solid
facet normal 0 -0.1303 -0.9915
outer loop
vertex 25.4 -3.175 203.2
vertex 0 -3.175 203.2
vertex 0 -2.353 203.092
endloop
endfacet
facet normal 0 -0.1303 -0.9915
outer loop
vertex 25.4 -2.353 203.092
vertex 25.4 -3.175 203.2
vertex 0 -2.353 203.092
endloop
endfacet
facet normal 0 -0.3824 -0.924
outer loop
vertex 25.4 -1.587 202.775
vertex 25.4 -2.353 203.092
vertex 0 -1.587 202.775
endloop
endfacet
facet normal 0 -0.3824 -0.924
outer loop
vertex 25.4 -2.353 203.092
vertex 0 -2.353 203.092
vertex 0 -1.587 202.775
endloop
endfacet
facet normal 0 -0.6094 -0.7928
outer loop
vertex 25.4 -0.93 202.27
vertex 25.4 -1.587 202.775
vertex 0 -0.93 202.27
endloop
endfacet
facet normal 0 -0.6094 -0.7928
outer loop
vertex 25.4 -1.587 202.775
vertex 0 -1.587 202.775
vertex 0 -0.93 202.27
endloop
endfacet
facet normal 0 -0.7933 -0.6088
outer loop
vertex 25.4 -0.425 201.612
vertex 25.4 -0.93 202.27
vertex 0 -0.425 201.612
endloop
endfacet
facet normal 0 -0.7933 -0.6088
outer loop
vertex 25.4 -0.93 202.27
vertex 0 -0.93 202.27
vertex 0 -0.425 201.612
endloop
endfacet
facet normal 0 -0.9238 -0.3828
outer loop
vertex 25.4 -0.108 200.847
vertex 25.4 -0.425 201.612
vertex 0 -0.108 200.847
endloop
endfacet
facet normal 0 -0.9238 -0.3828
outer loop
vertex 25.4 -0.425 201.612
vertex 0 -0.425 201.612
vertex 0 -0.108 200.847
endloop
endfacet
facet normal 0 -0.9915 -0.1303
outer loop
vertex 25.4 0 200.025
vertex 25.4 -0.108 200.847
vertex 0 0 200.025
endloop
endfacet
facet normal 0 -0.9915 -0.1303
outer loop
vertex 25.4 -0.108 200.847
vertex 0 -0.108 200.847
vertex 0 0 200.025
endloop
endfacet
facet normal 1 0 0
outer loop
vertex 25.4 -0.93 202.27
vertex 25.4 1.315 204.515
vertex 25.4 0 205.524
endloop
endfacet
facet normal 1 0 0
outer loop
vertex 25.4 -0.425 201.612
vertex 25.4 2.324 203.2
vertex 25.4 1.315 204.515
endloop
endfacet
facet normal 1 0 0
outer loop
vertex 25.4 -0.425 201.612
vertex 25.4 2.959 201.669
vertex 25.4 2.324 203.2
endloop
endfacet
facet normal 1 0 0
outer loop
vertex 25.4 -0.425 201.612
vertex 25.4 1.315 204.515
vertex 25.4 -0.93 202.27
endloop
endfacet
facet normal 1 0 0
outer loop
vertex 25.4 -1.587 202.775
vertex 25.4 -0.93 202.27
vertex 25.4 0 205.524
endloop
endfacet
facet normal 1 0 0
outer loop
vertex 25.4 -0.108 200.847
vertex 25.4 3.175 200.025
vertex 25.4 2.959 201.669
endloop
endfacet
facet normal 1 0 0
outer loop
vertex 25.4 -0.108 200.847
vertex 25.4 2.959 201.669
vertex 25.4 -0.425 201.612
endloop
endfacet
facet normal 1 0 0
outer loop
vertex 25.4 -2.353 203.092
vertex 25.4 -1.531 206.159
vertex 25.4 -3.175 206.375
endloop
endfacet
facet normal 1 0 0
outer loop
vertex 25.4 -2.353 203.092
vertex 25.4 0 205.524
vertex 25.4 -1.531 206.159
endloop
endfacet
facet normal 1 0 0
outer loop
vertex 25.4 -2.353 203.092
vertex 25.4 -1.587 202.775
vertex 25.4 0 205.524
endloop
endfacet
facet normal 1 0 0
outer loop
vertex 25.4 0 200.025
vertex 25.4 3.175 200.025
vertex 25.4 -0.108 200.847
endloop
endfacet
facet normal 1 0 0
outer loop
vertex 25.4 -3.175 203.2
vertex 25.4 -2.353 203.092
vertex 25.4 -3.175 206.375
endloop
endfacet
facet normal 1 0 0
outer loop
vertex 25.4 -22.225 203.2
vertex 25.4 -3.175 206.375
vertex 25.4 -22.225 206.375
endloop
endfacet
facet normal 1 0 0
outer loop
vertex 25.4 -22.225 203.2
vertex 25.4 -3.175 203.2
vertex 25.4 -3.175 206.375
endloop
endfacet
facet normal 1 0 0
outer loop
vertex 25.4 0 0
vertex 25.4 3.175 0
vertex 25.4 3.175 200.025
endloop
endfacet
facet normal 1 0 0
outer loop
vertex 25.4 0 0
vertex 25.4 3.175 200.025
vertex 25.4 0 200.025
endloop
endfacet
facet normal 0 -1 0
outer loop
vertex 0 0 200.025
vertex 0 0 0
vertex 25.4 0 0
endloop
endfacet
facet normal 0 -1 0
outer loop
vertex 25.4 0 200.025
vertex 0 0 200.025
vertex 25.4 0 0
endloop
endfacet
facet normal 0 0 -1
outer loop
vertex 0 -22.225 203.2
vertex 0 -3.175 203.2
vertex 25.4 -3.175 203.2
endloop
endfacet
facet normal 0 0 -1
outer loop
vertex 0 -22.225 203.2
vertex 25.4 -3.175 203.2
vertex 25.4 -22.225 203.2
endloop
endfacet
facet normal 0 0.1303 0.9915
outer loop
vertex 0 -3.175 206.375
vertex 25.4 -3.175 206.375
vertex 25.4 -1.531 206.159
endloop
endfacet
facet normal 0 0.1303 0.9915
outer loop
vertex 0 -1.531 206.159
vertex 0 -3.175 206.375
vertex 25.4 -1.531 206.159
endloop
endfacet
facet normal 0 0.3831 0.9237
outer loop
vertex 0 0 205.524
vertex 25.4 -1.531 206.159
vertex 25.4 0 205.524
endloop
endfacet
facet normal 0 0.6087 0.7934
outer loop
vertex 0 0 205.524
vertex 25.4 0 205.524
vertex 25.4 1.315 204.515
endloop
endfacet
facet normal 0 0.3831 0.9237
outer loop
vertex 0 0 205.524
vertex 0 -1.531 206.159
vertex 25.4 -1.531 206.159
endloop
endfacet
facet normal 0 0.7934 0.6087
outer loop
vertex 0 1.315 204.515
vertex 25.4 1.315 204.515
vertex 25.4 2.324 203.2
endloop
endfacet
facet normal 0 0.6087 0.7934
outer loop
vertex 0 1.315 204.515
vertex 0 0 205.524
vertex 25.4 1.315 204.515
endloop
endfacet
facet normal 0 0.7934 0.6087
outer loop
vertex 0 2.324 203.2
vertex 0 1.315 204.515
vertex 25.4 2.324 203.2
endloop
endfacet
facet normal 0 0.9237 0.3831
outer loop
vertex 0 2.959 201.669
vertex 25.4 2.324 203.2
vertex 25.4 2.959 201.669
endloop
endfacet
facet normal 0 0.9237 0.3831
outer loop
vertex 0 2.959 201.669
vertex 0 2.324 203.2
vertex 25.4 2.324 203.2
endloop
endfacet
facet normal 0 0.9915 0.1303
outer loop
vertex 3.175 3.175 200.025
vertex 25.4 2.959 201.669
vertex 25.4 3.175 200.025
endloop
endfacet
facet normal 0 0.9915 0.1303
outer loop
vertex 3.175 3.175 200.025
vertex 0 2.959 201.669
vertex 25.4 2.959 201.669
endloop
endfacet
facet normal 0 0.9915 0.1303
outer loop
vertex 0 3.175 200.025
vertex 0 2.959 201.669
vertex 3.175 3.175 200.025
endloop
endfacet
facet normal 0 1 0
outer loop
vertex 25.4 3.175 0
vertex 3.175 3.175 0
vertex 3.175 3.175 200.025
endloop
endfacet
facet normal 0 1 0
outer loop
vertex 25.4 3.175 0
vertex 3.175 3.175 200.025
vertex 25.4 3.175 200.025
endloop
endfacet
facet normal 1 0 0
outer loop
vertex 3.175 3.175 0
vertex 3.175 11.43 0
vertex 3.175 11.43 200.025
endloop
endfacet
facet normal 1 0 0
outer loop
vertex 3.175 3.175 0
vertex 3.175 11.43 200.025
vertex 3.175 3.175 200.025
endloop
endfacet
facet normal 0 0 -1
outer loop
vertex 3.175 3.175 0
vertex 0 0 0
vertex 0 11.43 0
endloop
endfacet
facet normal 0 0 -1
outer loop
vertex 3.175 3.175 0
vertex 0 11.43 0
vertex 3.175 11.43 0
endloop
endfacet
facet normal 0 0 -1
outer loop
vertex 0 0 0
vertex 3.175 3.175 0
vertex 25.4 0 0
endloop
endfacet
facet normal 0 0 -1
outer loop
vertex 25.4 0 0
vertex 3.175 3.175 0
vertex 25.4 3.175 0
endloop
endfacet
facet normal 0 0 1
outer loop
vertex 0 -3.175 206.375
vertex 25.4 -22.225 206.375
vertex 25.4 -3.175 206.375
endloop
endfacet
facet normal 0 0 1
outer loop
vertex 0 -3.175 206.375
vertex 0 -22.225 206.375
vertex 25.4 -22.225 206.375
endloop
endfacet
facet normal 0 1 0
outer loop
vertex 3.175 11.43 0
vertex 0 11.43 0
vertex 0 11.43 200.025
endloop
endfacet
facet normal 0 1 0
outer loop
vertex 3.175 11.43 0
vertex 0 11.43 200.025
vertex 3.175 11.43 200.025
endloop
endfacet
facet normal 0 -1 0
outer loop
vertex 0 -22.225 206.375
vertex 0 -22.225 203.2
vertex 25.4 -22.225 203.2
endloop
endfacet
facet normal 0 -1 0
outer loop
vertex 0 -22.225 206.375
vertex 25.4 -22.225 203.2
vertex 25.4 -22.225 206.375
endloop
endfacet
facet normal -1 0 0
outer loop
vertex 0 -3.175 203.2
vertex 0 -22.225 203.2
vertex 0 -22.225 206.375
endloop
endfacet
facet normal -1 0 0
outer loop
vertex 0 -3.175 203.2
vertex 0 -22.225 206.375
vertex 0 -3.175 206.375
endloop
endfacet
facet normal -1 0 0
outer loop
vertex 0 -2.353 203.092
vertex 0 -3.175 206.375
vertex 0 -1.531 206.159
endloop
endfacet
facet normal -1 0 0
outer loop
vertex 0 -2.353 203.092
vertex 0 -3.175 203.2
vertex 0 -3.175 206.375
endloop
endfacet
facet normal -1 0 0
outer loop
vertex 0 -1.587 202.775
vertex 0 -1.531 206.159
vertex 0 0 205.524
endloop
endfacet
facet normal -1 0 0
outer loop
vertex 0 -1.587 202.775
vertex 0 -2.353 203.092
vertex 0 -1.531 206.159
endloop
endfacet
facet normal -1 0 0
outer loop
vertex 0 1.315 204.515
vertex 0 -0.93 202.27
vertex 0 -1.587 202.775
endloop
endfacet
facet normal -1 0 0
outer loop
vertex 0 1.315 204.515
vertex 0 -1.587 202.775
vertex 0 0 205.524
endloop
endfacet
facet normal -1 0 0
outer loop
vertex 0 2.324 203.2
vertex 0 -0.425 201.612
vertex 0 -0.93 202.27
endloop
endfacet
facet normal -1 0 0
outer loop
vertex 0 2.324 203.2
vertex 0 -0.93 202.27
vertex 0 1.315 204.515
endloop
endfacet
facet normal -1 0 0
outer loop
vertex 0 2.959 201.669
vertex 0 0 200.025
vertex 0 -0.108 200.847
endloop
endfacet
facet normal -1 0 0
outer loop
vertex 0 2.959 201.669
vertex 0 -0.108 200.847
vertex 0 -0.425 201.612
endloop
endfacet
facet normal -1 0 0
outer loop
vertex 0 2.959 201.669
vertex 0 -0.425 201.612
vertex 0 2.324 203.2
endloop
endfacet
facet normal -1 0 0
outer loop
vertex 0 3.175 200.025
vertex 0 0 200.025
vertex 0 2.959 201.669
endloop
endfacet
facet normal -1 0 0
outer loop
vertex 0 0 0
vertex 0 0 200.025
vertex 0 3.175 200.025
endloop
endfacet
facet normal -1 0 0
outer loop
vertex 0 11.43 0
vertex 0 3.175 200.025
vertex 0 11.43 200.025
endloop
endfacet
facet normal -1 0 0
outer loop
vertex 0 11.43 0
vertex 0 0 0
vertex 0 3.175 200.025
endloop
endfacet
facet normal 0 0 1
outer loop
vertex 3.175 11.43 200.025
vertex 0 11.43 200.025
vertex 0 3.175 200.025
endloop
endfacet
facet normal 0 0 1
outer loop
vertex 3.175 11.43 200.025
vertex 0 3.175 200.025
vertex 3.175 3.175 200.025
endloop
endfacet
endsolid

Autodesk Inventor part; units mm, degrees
ref_plane "YZ Plane" through (0, 0, 0) normal (1, 0, 0) x (0, 1, 0)
ref_plane "XZ Plane" through (0, 0, 0) normal (0, 1, 0) x (-1, 0, 0)
ref_plane "XY Plane" through (0, 0, 0) normal (0, 0, 1) x (1, 0, 0)
sketch "Sketch1" plane through (0, 0, 0) normal (0, 0, 1) x (1, 0, 0)
  line L0 (0, 0) -> (25.4, 0)
  line L1 (0, 0) -> (0, 11.43)
  line L2 (3.175, 11.43) -> (3.175, 3.175)
  line L3 (3.175, 3.175) -> (25.4, 3.175)
  line L4 (0, 11.43) -> (3.175, 11.43)
  line L5 (25.4, 3.175) -> (25.4, 0)
  dimension "d0" = 25.4
  dimension "d2" = 11.43
  dimension "d3" = 90
  dimension "d4" = 3.175
extrude "Extrusion1" add sketch "Sketch1" along normal blind 200.025
sketch "Sketch2" plane through (0, -3.175, 203.2) normal (0, 0, 1) x (1, 0, 0)
  line L0 (25.4, 0) -> (0, 0)
  line L1 (0, 0) -> (0, -19.05)
  line L2 (0, -19.05) -> (25.4, -19.05)
  line L3 (25.4, -19.05) -> (25.4, 0)
edge flange "Flange1" height 25.4 angle 90 thickness 3.175 bend radius 3.175 thickness toward (0, 0, 1) relief straight relief width 3.175 relief depth 1.5875 edges at (12.7, 0, 200.025) wall of the first edge with corners at (25.4, -3.175, 203.2) (0, -3.175, 203.2) (0, -22.225, 203.2) (25.4, -22.225, 203.2)
bend "Bend1"
corner "Corner1"
equation "\"d7\" = BendReliefWidth"
equation "\"d8\" = BendReliefDepth"
equation "\"d9\" = MinimumRemnant"
equation "\"d10\" = BendRadius"
equation "\"d13\" = BendRadius"
equation "\"d14\" = CornerReliefSize"
equation "\"d15\" = GapSize"
equation "\"d16\" = JacobiRadiusSize"
equation "\"BendRadius\" = Thickness"
equation "\"BendReliefWidth\" = Thickness"
equation "\"BendReliefDepth\" = 0.5 * Thickness"
equation "\"CornerReliefSize\" = 4 * Thickness"
equation "\"MinimumRemnant\" = 2 * Thickness"
equation "\"TransitionRadius\" = BendRadius"
equation "\"JacobiRadiusSize\" = Thickness"
equation "\"GapSize\" = Thickness"
equation "\"Thickness\" = 3.175"
properties part number "Bent L"
